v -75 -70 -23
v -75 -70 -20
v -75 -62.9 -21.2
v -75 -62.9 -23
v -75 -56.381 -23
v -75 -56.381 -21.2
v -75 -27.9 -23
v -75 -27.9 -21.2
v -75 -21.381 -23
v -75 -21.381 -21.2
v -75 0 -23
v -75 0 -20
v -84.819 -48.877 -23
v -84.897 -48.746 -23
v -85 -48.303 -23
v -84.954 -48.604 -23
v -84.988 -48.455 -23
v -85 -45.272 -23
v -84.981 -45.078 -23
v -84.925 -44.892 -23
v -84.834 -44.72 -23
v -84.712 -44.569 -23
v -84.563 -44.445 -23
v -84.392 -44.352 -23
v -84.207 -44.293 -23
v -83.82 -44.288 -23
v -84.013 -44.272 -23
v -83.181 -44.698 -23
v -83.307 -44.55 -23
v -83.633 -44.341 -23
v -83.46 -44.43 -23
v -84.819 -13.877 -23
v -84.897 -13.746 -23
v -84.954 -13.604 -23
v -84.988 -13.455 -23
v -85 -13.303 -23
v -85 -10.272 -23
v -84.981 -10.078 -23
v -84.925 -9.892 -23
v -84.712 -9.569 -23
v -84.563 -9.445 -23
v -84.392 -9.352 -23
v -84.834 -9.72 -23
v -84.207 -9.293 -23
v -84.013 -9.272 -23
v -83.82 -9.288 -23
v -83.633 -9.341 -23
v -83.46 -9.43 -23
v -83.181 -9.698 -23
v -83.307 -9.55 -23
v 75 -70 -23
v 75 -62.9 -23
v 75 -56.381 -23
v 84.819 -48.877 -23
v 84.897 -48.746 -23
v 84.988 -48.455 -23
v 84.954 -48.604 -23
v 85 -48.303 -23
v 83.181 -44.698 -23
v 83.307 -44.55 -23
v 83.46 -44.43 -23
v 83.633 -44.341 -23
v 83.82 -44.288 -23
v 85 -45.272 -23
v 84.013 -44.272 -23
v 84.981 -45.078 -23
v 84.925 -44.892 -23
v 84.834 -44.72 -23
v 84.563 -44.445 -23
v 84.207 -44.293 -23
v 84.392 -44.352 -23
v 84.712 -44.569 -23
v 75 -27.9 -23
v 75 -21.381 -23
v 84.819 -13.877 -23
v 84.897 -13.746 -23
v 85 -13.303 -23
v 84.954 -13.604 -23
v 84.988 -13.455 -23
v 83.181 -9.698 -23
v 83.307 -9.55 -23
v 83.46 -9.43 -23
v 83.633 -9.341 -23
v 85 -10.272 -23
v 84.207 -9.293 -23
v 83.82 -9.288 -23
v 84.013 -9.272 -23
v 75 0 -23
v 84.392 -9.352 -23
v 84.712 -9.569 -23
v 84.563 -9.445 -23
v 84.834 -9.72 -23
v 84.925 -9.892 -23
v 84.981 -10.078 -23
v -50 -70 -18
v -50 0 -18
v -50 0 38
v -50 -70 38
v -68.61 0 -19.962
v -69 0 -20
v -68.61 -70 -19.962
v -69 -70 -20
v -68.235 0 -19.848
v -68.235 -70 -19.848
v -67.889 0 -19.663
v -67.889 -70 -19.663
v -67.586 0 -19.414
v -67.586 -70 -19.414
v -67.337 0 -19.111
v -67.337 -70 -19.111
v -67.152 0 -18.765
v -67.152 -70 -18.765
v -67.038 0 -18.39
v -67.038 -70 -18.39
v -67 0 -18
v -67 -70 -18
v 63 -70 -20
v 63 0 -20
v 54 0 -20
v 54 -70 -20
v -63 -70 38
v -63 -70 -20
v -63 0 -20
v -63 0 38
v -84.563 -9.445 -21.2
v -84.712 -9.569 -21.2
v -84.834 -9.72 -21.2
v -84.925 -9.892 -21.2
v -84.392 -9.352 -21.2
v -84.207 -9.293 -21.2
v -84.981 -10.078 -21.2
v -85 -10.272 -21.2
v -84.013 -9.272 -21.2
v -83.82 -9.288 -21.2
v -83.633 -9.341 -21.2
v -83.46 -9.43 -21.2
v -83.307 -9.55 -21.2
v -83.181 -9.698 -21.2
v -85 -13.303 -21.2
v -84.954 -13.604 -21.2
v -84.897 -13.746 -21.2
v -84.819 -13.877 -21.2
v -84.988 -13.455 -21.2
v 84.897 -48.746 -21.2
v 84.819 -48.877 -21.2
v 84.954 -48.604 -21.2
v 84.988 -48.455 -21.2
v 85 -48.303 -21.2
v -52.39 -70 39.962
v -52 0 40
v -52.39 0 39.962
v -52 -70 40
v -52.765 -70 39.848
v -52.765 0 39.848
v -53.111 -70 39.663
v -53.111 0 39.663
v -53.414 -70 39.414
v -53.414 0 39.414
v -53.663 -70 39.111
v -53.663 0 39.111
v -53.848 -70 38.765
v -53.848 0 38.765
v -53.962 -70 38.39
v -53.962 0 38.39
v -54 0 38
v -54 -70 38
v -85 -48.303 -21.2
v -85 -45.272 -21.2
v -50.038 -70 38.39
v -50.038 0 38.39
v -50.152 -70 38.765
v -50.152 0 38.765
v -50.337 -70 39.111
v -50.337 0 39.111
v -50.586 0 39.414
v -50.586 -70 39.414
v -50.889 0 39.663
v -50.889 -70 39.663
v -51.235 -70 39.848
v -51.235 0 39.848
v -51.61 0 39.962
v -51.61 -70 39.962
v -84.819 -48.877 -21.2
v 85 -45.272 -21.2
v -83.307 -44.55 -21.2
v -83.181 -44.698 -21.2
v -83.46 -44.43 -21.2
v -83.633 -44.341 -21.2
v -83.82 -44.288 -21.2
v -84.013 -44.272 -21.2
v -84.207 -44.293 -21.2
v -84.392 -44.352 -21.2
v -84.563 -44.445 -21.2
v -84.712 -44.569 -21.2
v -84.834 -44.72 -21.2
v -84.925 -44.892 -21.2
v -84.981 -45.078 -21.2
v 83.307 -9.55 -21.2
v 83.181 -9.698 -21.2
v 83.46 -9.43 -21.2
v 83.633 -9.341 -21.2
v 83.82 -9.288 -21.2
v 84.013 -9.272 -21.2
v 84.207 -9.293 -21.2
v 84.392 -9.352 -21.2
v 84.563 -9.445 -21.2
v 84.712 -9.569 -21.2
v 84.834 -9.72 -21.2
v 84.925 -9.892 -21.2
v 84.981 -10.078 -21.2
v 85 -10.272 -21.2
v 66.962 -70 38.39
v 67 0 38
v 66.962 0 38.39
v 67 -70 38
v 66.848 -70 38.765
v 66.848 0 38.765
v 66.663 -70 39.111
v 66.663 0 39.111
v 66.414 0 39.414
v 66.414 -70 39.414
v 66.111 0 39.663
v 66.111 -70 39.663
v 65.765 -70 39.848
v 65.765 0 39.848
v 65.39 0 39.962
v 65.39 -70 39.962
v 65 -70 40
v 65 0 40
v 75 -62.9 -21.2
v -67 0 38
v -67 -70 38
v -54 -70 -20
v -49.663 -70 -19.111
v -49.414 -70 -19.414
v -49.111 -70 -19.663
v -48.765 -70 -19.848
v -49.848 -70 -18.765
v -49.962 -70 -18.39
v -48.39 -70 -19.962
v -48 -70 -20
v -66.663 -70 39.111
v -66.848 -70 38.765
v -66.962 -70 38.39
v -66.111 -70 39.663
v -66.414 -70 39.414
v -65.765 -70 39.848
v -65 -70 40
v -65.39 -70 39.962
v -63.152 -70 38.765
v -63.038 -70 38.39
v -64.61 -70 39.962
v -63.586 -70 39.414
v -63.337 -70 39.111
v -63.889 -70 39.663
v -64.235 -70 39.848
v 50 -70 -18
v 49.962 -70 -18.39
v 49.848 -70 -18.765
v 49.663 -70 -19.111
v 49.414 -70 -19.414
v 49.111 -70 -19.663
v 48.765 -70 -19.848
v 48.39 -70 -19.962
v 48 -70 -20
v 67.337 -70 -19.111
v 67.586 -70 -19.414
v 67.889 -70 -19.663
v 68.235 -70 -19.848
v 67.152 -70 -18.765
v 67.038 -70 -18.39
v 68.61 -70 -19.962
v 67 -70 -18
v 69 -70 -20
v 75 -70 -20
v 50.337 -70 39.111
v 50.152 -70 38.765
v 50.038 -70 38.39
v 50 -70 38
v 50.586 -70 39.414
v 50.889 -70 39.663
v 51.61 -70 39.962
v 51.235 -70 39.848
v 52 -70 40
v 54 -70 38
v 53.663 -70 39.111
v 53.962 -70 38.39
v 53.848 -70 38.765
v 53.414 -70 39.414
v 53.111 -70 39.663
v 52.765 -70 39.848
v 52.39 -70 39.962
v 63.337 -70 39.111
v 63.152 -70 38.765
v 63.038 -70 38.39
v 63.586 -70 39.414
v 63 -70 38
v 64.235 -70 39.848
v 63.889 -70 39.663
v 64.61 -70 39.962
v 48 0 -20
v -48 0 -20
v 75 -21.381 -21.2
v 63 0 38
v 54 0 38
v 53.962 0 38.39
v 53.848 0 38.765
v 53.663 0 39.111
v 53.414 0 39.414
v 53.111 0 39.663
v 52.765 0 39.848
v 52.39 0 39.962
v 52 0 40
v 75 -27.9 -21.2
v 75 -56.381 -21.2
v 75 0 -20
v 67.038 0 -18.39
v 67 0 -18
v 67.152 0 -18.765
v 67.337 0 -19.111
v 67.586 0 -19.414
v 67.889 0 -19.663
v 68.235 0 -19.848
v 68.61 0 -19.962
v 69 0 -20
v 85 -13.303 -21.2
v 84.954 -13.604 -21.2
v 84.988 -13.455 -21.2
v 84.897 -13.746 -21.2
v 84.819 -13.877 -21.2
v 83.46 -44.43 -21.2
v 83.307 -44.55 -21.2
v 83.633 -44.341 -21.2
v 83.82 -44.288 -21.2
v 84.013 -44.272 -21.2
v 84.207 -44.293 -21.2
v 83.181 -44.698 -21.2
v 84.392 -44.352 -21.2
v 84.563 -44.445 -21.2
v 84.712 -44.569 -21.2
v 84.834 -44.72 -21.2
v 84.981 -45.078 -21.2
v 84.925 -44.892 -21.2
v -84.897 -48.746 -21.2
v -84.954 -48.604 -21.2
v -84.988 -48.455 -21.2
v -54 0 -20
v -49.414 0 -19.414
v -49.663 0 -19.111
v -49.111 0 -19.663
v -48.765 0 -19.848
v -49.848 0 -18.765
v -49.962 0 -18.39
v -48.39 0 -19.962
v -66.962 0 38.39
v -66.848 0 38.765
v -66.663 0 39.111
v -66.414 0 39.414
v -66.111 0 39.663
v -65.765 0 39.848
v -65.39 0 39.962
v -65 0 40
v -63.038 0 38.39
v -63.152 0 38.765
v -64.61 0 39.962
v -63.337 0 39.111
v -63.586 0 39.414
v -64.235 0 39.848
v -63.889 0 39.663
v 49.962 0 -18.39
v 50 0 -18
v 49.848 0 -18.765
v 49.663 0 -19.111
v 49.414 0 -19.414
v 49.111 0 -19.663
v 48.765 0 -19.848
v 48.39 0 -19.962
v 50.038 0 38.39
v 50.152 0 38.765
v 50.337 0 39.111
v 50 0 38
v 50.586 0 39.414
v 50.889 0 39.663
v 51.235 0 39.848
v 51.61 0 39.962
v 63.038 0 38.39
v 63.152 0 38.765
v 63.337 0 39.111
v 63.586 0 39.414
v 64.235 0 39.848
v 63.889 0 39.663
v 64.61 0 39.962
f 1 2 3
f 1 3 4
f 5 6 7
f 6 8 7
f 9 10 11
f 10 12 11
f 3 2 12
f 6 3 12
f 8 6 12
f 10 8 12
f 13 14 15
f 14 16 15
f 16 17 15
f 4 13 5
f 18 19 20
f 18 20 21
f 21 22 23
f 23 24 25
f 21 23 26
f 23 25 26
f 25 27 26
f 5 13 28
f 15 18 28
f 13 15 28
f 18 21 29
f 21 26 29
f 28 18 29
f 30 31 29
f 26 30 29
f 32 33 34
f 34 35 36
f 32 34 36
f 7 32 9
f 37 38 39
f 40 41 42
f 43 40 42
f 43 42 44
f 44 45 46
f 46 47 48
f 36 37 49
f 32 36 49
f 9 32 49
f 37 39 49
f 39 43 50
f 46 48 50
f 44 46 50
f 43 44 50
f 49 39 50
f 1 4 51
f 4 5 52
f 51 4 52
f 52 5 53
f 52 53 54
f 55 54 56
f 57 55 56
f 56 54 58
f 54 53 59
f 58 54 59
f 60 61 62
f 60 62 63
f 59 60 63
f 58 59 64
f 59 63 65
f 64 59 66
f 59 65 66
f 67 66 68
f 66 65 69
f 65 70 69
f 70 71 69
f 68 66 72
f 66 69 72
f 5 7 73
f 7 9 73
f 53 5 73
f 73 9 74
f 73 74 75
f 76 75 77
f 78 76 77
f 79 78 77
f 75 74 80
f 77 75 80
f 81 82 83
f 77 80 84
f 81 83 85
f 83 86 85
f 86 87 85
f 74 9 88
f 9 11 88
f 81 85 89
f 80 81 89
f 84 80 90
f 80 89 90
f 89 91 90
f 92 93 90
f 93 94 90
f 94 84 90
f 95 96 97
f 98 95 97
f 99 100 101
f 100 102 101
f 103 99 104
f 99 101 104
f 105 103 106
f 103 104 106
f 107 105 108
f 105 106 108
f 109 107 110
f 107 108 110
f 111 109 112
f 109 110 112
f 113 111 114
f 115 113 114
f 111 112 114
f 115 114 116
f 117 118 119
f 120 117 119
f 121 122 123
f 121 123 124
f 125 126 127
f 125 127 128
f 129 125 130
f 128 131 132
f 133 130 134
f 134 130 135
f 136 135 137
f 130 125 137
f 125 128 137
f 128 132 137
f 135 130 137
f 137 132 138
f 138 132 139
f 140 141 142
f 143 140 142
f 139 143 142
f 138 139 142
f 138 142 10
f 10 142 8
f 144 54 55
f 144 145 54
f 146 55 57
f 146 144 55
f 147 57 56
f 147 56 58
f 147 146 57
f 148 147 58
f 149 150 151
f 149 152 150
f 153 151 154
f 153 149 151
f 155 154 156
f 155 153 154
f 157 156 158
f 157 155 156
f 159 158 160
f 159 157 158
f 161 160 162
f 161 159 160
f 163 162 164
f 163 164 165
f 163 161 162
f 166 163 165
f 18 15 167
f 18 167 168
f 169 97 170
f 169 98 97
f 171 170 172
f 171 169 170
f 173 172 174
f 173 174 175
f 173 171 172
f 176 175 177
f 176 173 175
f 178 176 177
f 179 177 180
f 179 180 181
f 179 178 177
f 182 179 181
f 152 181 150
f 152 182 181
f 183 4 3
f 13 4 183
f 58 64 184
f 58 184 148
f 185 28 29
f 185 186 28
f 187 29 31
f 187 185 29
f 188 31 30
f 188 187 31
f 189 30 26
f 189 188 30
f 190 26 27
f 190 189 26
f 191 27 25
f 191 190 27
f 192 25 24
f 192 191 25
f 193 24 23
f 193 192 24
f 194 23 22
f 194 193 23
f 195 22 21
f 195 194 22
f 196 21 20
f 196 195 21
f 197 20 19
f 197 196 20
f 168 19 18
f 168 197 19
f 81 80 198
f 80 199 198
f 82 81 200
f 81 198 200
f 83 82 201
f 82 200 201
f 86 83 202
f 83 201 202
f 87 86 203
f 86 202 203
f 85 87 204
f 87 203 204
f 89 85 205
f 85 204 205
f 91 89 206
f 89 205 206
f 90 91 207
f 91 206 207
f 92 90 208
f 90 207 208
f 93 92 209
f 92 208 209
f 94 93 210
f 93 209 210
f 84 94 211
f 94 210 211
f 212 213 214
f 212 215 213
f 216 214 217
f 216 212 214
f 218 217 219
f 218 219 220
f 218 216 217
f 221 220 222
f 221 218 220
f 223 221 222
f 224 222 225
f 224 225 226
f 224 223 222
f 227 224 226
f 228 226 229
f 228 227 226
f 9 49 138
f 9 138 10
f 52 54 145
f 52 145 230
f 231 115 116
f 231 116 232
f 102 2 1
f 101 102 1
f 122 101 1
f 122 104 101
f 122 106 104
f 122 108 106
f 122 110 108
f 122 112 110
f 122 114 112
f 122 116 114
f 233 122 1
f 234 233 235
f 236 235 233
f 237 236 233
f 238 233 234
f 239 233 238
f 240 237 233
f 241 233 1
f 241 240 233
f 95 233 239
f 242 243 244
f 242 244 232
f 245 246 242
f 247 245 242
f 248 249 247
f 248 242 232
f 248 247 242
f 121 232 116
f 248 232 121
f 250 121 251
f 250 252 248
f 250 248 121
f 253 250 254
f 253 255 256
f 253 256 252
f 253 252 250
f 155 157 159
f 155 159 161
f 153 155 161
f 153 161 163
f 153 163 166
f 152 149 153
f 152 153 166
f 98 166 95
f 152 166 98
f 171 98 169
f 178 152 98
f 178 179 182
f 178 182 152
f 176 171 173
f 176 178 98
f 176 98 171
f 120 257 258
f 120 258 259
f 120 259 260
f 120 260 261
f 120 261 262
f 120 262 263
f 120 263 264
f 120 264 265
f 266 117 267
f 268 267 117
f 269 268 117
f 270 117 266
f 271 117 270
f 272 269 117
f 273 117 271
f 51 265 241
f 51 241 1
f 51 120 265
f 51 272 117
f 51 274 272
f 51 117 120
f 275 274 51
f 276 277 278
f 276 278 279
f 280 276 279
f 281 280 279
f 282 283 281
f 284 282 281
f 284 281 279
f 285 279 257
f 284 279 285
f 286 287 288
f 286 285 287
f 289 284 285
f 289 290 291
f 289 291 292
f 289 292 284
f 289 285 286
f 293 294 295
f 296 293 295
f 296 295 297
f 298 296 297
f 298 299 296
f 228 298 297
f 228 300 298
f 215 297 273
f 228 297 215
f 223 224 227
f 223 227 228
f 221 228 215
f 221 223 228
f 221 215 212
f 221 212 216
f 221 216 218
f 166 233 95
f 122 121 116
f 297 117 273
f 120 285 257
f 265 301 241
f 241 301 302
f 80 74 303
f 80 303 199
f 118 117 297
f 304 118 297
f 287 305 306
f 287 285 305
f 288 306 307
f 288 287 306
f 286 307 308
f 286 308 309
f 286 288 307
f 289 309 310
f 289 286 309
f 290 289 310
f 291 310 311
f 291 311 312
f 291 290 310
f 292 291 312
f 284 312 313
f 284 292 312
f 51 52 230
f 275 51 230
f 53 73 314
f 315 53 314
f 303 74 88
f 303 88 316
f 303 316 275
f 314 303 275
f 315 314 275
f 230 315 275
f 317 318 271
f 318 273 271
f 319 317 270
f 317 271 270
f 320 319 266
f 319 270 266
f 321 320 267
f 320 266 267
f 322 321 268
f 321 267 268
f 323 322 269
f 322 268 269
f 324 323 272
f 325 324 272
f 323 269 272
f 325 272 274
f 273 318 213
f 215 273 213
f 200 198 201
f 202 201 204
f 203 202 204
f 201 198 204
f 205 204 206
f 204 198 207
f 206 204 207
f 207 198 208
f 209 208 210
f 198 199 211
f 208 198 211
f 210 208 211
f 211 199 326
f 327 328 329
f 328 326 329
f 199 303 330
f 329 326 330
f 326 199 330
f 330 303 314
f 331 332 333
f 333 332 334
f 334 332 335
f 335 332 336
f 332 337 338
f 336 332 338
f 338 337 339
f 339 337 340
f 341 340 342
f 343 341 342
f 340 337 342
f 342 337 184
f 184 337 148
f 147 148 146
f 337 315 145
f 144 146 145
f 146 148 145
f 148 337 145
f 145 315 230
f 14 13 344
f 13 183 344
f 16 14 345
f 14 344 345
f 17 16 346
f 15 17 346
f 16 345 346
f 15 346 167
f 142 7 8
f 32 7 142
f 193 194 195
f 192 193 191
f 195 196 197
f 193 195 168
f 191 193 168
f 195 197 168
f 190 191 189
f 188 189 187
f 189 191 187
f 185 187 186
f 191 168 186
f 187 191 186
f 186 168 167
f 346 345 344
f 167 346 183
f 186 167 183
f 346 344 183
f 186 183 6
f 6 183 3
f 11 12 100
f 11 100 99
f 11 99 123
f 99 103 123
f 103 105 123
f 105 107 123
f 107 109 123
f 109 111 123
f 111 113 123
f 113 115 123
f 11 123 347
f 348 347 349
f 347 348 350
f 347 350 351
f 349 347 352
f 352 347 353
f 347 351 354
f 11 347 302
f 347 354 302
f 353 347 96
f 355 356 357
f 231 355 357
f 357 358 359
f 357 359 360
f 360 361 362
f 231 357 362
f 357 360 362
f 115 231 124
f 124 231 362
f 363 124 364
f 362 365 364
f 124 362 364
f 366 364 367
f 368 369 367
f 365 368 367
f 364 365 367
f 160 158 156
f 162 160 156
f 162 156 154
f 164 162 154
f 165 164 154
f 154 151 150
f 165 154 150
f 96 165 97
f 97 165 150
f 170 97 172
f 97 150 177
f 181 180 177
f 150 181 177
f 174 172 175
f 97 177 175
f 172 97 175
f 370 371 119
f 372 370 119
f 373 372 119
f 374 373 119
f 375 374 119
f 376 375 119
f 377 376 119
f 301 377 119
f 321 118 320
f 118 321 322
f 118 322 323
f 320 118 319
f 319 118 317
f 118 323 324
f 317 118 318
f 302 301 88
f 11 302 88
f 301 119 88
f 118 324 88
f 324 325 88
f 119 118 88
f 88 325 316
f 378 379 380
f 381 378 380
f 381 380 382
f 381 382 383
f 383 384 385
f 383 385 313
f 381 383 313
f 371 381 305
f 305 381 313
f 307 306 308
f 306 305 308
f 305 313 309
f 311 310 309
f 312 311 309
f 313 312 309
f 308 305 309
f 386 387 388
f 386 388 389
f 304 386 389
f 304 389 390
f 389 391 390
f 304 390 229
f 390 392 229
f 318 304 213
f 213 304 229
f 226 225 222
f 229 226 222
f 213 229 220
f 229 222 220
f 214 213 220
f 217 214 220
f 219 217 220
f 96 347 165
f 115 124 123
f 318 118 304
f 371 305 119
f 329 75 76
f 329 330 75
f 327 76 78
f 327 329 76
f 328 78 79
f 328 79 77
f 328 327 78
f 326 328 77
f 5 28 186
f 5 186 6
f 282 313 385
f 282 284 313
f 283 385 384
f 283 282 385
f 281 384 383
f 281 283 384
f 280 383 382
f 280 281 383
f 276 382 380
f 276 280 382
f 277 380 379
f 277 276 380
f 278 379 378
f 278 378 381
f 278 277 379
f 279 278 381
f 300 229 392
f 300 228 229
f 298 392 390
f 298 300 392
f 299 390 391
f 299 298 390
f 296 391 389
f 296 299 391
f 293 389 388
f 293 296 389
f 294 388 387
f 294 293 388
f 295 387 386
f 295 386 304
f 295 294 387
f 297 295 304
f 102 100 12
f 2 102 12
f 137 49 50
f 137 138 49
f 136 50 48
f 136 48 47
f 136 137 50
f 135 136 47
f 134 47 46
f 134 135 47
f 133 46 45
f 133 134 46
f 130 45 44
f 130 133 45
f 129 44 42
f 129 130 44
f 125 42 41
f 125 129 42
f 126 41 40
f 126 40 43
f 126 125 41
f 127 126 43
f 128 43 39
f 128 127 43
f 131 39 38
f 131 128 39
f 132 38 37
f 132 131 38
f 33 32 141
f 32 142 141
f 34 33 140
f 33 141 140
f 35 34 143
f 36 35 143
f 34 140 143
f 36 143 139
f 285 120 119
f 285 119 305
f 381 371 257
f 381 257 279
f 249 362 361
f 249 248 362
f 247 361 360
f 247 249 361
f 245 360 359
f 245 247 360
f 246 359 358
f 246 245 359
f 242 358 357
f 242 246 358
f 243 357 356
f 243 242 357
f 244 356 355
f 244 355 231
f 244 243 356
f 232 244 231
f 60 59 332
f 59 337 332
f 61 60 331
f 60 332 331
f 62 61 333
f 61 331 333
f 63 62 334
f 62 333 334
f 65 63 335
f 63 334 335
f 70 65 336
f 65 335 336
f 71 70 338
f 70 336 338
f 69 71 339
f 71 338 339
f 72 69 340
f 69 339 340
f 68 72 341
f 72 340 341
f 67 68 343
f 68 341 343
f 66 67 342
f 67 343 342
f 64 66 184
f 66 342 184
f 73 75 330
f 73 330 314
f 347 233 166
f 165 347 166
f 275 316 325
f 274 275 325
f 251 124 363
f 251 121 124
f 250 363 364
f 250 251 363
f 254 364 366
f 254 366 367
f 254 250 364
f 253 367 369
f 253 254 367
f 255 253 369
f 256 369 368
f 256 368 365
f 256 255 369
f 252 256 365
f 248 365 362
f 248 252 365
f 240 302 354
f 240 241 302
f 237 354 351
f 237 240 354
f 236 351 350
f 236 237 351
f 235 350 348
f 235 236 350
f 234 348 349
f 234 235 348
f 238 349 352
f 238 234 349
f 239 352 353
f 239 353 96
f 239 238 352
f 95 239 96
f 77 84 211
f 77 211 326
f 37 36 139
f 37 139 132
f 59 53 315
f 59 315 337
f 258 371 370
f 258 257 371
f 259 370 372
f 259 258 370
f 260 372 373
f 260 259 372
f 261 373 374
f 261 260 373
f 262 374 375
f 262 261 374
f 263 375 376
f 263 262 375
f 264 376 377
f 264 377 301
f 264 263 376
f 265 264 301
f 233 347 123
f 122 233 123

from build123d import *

# Parameters (mm, degrees)
F0_W     = 4
F0_H     = 60
F1_DEPTH = 70
F2_R     = 1.99999
F3_R     = 2
F5_DEPTH = 1.8
F6_R     = 1


# Not quite as in the source:
# - a fillet or chamfer is up to 0.001 mm smaller than in the source, because OpenCascade refuses the exact size


with BuildPart() as f1:
    # F0 (on Front) → F1 (new body)
    with BuildSketch(Plane.XZ):
        Polygon((0, -20), (0, -23), (65, -23), (65, -21), (67, -21), (67, -20), (63, -20), (54, -20), (50, -20), align=None)
        Polygon((-65, -23), (0, -23), (0, -20), (-50, -20), (-54, -20), (-63, -20), (-67, -20), (-67, -21), (-65, -21), align=None)
        Polygon((65, -21), (65, -23), (71, -23), (71, -22.25), (71, -21), (67, -21), align=None)
        Polygon((-71, -23), (-65, -23), (-65, -21), (-67, -21), (-71, -21), (-71, -22.25), align=None)
        Polygon((71, -22.25), (71, -23), (75, -23), (75, -21), (71, -21), align=None)
        with Locations((52, 10)):
            Rectangle(F0_W, F0_H)
        with Locations((-52, 10)):
            Rectangle(F0_W, F0_H)
        Polygon((-75, -23), (-71, -23), (-71, -22.25), (-71, -21), (-75, -21), align=None)
        Polygon((67, -20), (67, -21), (71, -21), (75, -21), (75, -20), align=None)
        Polygon((-71, -21), (-67, -21), (-67, -20), (-75, -20), (-75, -21), align=None)
        with Locations((65, 10)):
            Rectangle(F0_W, F0_H)
        with Locations((-65, 10)):
            Rectangle(F0_W, F0_H)
    extrude(amount=F1_DEPTH)

    # F2 (radius 2 in the source; OpenCascade refuses exactly that, so slightly less here)
    f2_edges = [f1.edges().sort_by_distance(p)[0] for p in [
        (-67, -35, 40),
        (-63, -35, 40),
        (-54, -35, 40),
        (-50, -35, 40),
        (54, -35, 40),
        (50, -35, 40),
        (63, -35, 40),
        (67, -35, 40),
    ]]
    fillet(f2_edges, radius=F2_R)

    # F3
    f3_edges = [f1.edges().sort_by_distance(p)[0] for p in [
        (-50, -35, -20),
        (50, -35, -20),
        (-67, -35, -20),
        (67, -35, -20),
    ]]
    fillet(f3_edges, radius=F3_R)

    # F4 (on face) → F5 (join)
    with BuildSketch(Plane(origin=(0, 0, -23), x_dir=(1, 0, 0), z_dir=(0, 0, -1))):
        Polygon((-85, 42.1), (-75, 56.3814800674), (-75, 62.9), (-85, 48.6185199326), align=None)
        Polygon((-75, 21.3814800674), (-75, 27.9), (-85, 13.6185199326), (-85, 7.1), align=None)
        Polygon((85, 13.6185199326), (75, 27.9), (75, 21.3814800674), (85, 7.1), align=None)
        Polygon((75, 62.9), (75, 56.3814800674), (85, 42.1), (85, 48.6185199326), align=None)
    extrude(amount=-F5_DEPTH)

    # F6
    f6_edges = [f1.edges().sort_by_distance(p)[0] for p in [
        (85, -42.1, -22.1),
        (85, -7.1, -22.1),
        (85, -13.61852, -22.1),
        (85, -48.61852, -22.1),
        (-85, -7.1, -22.1),
        (-85, -13.61852, -22.1),
        (-85, -42.1, -22.1),
        (-85, -48.61852, -22.1),
    ]]
    fillet(f6_edges, radius=F6_R)


solid = f1.part
